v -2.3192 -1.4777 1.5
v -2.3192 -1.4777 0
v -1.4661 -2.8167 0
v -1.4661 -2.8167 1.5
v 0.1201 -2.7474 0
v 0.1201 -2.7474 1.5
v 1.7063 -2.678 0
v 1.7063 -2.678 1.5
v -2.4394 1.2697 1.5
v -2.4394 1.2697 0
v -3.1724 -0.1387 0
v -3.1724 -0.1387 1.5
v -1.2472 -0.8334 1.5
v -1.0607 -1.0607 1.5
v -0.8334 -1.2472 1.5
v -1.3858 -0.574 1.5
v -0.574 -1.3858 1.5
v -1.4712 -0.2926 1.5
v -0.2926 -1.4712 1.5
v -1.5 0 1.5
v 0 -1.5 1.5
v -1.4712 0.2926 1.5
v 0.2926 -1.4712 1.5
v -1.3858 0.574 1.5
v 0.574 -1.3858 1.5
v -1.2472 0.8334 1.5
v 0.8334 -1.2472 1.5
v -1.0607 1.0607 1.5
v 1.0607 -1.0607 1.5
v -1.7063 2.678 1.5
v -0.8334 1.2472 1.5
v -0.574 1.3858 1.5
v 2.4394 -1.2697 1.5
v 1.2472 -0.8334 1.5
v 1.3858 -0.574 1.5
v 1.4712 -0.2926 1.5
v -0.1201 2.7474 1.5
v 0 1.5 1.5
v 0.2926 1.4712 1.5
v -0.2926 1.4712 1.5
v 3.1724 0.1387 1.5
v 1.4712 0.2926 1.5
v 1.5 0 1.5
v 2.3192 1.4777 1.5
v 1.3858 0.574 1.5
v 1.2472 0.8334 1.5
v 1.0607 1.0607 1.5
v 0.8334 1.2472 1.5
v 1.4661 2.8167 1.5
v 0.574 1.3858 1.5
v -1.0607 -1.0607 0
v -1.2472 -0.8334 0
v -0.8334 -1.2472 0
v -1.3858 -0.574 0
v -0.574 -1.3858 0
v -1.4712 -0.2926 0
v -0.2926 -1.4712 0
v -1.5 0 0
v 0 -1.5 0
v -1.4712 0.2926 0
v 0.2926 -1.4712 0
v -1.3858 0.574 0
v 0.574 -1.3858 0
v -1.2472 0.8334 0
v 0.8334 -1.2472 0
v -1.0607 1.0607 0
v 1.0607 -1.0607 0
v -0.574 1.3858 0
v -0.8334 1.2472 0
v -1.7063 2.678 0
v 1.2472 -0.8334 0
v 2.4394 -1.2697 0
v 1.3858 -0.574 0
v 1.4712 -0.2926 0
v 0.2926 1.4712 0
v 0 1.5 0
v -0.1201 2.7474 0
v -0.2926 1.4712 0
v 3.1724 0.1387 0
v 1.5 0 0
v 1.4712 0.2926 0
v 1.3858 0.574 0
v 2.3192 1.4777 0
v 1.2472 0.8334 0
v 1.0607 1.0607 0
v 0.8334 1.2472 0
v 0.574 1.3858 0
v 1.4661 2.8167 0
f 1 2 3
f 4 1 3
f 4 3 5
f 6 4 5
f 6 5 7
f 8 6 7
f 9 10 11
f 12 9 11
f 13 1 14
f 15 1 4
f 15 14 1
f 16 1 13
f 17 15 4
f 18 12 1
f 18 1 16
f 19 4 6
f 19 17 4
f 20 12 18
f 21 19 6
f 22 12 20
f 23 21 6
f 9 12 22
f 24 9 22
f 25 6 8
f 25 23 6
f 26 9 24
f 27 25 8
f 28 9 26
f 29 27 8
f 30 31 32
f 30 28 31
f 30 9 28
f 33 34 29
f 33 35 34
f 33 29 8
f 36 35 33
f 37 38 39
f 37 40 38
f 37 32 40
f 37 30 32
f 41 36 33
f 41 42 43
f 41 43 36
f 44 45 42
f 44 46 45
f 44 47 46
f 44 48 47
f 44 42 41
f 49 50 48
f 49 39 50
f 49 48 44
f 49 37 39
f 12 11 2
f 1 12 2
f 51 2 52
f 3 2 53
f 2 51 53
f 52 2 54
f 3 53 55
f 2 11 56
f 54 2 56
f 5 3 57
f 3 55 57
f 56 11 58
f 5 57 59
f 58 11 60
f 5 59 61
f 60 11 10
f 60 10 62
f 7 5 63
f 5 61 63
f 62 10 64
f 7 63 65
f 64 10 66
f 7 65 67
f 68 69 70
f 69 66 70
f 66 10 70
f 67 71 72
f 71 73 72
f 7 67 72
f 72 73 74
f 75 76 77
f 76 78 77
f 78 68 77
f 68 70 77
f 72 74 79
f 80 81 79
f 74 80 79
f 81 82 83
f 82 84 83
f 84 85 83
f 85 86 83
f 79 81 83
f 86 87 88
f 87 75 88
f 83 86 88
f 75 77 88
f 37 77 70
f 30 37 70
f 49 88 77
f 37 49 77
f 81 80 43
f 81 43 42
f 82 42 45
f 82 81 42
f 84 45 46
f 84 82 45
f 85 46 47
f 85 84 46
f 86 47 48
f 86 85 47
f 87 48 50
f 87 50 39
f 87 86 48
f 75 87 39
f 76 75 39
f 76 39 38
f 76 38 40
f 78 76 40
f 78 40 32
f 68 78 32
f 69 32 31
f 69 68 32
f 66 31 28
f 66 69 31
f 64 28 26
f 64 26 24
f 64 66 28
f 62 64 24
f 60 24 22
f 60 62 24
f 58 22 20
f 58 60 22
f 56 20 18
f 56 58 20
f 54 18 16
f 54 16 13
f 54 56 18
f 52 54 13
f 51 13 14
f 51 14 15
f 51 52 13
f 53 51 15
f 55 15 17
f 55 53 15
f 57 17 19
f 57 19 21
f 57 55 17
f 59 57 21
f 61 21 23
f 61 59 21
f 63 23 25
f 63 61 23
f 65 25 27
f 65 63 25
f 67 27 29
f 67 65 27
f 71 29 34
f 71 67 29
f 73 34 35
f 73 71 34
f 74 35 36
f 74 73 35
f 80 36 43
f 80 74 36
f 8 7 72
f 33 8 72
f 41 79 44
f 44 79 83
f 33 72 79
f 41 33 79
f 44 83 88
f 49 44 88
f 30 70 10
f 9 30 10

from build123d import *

# Parameters (mm, degrees)
F0_R     = 1.5
F1_DEPTH = 1.5


with BuildPart() as f1:
    # F0 (on Top) → F1 (new body)
    with BuildSketch(Plane.XY):
        with BuildLine():
            ThreePointArc((-0.1201086231, 2.7473758241), (1.2696708079, 2.4393515613), (2.3192429637, 1.4777050029))
            Line((2.3192429637, 1.4777050029), (1.4660895902, 2.8167205482))
            Line((1.4660895902, 2.8167205482), (-0.1201086231, 2.7473758241))
        make_face()
        with BuildLine():
            Line((1.706306755, -2.6780311034), (2.4393515428, -1.2696708434))
            ThreePointArc((2.4393515428, -1.2696708434), (1.477704987, -2.3192429738), (0.1201085757, -2.7473758261))
            Line((0.1201085757, -2.7473758261), (1.706306755, -2.6780311034))
        make_face()
        with BuildLine():
            ThreePointArc((-2.4393515589, 1.2696708124), (-1.4777050217, 2.3192429516), (-0.1201086231, 2.7473758241))
            Line((-0.1201086231, 2.7473758241), (-1.706306755, 2.6780311034))
            Line((-1.706306755, 2.6780311034), (-2.4393515589, 1.2696708124))
        make_face()
        with BuildLine():
            ThreePointArc((2.3192429637, 1.4777050029), (2.6401153526, 0.7696043951), (2.75, 0))
            ThreePointArc((2.75, 0), (2.671209159, -0.6535607307), (2.4393515428, -1.2696708434))
            Line((2.4393515428, -1.2696708434), (3.1723963452, 0.1386894448))
            Line((3.1723963452, 0.1386894448), (2.3192429637, 1.4777050029))
        make_face()
        with BuildLine():
            Line((-1.4660895902, -2.8167205482), (0.1201085757, -2.7473758261))
            ThreePointArc((0.1201085757, -2.7473758261), (-1.2696708891, -2.439351519), (-2.3192430366, -1.4777048885))
            Line((-2.3192430366, -1.4777048885), (-1.4660895902, -2.8167205482))
        make_face()
        with BuildLine():
            ThreePointArc((-2.3192430366, -1.4777048885), (-2.7473758282, -0.1201085279), (-2.4393515589, 1.2696708124))
            Line((-2.4393515589, 1.2696708124), (-3.1723963452, -0.1386894448))
            Line((-3.1723963452, -0.1386894448), (-2.3192430366, -1.4777048885))
        make_face()
        with BuildLine():
            ThreePointArc((2.4393515428, -1.2696708434), (2.671209159, -0.6535607307), (2.75, 0))
            ThreePointArc((2.75, 0), (2.6401153526, 0.7696043951), (2.3192429637, 1.4777050029))
            ThreePointArc((2.3192429637, 1.4777050029), (1.2696708079, 2.4393515613), (-0.1201086231, 2.7473758241))
            ThreePointArc((-0.1201086231, 2.7473758241), (-1.4777050217, 2.3192429516), (-2.4393515589, 1.2696708124))
            ThreePointArc((-2.4393515589, 1.2696708124), (-2.7473758282, -0.1201085279), (-2.3192430366, -1.4777048885))
            ThreePointArc((-2.3192430366, -1.4777048885), (-1.2696708891, -2.439351519), (0.1201085757, -2.7473758261))
            ThreePointArc((0.1201085757, -2.7473758261), (1.477704987, -2.3192429738), (2.4393515428, -1.2696708434))
        make_face()
        Circle(F0_R, mode=Mode.SUBTRACT)
    extrude(amount=F1_DEPTH)


solid = f1.part
